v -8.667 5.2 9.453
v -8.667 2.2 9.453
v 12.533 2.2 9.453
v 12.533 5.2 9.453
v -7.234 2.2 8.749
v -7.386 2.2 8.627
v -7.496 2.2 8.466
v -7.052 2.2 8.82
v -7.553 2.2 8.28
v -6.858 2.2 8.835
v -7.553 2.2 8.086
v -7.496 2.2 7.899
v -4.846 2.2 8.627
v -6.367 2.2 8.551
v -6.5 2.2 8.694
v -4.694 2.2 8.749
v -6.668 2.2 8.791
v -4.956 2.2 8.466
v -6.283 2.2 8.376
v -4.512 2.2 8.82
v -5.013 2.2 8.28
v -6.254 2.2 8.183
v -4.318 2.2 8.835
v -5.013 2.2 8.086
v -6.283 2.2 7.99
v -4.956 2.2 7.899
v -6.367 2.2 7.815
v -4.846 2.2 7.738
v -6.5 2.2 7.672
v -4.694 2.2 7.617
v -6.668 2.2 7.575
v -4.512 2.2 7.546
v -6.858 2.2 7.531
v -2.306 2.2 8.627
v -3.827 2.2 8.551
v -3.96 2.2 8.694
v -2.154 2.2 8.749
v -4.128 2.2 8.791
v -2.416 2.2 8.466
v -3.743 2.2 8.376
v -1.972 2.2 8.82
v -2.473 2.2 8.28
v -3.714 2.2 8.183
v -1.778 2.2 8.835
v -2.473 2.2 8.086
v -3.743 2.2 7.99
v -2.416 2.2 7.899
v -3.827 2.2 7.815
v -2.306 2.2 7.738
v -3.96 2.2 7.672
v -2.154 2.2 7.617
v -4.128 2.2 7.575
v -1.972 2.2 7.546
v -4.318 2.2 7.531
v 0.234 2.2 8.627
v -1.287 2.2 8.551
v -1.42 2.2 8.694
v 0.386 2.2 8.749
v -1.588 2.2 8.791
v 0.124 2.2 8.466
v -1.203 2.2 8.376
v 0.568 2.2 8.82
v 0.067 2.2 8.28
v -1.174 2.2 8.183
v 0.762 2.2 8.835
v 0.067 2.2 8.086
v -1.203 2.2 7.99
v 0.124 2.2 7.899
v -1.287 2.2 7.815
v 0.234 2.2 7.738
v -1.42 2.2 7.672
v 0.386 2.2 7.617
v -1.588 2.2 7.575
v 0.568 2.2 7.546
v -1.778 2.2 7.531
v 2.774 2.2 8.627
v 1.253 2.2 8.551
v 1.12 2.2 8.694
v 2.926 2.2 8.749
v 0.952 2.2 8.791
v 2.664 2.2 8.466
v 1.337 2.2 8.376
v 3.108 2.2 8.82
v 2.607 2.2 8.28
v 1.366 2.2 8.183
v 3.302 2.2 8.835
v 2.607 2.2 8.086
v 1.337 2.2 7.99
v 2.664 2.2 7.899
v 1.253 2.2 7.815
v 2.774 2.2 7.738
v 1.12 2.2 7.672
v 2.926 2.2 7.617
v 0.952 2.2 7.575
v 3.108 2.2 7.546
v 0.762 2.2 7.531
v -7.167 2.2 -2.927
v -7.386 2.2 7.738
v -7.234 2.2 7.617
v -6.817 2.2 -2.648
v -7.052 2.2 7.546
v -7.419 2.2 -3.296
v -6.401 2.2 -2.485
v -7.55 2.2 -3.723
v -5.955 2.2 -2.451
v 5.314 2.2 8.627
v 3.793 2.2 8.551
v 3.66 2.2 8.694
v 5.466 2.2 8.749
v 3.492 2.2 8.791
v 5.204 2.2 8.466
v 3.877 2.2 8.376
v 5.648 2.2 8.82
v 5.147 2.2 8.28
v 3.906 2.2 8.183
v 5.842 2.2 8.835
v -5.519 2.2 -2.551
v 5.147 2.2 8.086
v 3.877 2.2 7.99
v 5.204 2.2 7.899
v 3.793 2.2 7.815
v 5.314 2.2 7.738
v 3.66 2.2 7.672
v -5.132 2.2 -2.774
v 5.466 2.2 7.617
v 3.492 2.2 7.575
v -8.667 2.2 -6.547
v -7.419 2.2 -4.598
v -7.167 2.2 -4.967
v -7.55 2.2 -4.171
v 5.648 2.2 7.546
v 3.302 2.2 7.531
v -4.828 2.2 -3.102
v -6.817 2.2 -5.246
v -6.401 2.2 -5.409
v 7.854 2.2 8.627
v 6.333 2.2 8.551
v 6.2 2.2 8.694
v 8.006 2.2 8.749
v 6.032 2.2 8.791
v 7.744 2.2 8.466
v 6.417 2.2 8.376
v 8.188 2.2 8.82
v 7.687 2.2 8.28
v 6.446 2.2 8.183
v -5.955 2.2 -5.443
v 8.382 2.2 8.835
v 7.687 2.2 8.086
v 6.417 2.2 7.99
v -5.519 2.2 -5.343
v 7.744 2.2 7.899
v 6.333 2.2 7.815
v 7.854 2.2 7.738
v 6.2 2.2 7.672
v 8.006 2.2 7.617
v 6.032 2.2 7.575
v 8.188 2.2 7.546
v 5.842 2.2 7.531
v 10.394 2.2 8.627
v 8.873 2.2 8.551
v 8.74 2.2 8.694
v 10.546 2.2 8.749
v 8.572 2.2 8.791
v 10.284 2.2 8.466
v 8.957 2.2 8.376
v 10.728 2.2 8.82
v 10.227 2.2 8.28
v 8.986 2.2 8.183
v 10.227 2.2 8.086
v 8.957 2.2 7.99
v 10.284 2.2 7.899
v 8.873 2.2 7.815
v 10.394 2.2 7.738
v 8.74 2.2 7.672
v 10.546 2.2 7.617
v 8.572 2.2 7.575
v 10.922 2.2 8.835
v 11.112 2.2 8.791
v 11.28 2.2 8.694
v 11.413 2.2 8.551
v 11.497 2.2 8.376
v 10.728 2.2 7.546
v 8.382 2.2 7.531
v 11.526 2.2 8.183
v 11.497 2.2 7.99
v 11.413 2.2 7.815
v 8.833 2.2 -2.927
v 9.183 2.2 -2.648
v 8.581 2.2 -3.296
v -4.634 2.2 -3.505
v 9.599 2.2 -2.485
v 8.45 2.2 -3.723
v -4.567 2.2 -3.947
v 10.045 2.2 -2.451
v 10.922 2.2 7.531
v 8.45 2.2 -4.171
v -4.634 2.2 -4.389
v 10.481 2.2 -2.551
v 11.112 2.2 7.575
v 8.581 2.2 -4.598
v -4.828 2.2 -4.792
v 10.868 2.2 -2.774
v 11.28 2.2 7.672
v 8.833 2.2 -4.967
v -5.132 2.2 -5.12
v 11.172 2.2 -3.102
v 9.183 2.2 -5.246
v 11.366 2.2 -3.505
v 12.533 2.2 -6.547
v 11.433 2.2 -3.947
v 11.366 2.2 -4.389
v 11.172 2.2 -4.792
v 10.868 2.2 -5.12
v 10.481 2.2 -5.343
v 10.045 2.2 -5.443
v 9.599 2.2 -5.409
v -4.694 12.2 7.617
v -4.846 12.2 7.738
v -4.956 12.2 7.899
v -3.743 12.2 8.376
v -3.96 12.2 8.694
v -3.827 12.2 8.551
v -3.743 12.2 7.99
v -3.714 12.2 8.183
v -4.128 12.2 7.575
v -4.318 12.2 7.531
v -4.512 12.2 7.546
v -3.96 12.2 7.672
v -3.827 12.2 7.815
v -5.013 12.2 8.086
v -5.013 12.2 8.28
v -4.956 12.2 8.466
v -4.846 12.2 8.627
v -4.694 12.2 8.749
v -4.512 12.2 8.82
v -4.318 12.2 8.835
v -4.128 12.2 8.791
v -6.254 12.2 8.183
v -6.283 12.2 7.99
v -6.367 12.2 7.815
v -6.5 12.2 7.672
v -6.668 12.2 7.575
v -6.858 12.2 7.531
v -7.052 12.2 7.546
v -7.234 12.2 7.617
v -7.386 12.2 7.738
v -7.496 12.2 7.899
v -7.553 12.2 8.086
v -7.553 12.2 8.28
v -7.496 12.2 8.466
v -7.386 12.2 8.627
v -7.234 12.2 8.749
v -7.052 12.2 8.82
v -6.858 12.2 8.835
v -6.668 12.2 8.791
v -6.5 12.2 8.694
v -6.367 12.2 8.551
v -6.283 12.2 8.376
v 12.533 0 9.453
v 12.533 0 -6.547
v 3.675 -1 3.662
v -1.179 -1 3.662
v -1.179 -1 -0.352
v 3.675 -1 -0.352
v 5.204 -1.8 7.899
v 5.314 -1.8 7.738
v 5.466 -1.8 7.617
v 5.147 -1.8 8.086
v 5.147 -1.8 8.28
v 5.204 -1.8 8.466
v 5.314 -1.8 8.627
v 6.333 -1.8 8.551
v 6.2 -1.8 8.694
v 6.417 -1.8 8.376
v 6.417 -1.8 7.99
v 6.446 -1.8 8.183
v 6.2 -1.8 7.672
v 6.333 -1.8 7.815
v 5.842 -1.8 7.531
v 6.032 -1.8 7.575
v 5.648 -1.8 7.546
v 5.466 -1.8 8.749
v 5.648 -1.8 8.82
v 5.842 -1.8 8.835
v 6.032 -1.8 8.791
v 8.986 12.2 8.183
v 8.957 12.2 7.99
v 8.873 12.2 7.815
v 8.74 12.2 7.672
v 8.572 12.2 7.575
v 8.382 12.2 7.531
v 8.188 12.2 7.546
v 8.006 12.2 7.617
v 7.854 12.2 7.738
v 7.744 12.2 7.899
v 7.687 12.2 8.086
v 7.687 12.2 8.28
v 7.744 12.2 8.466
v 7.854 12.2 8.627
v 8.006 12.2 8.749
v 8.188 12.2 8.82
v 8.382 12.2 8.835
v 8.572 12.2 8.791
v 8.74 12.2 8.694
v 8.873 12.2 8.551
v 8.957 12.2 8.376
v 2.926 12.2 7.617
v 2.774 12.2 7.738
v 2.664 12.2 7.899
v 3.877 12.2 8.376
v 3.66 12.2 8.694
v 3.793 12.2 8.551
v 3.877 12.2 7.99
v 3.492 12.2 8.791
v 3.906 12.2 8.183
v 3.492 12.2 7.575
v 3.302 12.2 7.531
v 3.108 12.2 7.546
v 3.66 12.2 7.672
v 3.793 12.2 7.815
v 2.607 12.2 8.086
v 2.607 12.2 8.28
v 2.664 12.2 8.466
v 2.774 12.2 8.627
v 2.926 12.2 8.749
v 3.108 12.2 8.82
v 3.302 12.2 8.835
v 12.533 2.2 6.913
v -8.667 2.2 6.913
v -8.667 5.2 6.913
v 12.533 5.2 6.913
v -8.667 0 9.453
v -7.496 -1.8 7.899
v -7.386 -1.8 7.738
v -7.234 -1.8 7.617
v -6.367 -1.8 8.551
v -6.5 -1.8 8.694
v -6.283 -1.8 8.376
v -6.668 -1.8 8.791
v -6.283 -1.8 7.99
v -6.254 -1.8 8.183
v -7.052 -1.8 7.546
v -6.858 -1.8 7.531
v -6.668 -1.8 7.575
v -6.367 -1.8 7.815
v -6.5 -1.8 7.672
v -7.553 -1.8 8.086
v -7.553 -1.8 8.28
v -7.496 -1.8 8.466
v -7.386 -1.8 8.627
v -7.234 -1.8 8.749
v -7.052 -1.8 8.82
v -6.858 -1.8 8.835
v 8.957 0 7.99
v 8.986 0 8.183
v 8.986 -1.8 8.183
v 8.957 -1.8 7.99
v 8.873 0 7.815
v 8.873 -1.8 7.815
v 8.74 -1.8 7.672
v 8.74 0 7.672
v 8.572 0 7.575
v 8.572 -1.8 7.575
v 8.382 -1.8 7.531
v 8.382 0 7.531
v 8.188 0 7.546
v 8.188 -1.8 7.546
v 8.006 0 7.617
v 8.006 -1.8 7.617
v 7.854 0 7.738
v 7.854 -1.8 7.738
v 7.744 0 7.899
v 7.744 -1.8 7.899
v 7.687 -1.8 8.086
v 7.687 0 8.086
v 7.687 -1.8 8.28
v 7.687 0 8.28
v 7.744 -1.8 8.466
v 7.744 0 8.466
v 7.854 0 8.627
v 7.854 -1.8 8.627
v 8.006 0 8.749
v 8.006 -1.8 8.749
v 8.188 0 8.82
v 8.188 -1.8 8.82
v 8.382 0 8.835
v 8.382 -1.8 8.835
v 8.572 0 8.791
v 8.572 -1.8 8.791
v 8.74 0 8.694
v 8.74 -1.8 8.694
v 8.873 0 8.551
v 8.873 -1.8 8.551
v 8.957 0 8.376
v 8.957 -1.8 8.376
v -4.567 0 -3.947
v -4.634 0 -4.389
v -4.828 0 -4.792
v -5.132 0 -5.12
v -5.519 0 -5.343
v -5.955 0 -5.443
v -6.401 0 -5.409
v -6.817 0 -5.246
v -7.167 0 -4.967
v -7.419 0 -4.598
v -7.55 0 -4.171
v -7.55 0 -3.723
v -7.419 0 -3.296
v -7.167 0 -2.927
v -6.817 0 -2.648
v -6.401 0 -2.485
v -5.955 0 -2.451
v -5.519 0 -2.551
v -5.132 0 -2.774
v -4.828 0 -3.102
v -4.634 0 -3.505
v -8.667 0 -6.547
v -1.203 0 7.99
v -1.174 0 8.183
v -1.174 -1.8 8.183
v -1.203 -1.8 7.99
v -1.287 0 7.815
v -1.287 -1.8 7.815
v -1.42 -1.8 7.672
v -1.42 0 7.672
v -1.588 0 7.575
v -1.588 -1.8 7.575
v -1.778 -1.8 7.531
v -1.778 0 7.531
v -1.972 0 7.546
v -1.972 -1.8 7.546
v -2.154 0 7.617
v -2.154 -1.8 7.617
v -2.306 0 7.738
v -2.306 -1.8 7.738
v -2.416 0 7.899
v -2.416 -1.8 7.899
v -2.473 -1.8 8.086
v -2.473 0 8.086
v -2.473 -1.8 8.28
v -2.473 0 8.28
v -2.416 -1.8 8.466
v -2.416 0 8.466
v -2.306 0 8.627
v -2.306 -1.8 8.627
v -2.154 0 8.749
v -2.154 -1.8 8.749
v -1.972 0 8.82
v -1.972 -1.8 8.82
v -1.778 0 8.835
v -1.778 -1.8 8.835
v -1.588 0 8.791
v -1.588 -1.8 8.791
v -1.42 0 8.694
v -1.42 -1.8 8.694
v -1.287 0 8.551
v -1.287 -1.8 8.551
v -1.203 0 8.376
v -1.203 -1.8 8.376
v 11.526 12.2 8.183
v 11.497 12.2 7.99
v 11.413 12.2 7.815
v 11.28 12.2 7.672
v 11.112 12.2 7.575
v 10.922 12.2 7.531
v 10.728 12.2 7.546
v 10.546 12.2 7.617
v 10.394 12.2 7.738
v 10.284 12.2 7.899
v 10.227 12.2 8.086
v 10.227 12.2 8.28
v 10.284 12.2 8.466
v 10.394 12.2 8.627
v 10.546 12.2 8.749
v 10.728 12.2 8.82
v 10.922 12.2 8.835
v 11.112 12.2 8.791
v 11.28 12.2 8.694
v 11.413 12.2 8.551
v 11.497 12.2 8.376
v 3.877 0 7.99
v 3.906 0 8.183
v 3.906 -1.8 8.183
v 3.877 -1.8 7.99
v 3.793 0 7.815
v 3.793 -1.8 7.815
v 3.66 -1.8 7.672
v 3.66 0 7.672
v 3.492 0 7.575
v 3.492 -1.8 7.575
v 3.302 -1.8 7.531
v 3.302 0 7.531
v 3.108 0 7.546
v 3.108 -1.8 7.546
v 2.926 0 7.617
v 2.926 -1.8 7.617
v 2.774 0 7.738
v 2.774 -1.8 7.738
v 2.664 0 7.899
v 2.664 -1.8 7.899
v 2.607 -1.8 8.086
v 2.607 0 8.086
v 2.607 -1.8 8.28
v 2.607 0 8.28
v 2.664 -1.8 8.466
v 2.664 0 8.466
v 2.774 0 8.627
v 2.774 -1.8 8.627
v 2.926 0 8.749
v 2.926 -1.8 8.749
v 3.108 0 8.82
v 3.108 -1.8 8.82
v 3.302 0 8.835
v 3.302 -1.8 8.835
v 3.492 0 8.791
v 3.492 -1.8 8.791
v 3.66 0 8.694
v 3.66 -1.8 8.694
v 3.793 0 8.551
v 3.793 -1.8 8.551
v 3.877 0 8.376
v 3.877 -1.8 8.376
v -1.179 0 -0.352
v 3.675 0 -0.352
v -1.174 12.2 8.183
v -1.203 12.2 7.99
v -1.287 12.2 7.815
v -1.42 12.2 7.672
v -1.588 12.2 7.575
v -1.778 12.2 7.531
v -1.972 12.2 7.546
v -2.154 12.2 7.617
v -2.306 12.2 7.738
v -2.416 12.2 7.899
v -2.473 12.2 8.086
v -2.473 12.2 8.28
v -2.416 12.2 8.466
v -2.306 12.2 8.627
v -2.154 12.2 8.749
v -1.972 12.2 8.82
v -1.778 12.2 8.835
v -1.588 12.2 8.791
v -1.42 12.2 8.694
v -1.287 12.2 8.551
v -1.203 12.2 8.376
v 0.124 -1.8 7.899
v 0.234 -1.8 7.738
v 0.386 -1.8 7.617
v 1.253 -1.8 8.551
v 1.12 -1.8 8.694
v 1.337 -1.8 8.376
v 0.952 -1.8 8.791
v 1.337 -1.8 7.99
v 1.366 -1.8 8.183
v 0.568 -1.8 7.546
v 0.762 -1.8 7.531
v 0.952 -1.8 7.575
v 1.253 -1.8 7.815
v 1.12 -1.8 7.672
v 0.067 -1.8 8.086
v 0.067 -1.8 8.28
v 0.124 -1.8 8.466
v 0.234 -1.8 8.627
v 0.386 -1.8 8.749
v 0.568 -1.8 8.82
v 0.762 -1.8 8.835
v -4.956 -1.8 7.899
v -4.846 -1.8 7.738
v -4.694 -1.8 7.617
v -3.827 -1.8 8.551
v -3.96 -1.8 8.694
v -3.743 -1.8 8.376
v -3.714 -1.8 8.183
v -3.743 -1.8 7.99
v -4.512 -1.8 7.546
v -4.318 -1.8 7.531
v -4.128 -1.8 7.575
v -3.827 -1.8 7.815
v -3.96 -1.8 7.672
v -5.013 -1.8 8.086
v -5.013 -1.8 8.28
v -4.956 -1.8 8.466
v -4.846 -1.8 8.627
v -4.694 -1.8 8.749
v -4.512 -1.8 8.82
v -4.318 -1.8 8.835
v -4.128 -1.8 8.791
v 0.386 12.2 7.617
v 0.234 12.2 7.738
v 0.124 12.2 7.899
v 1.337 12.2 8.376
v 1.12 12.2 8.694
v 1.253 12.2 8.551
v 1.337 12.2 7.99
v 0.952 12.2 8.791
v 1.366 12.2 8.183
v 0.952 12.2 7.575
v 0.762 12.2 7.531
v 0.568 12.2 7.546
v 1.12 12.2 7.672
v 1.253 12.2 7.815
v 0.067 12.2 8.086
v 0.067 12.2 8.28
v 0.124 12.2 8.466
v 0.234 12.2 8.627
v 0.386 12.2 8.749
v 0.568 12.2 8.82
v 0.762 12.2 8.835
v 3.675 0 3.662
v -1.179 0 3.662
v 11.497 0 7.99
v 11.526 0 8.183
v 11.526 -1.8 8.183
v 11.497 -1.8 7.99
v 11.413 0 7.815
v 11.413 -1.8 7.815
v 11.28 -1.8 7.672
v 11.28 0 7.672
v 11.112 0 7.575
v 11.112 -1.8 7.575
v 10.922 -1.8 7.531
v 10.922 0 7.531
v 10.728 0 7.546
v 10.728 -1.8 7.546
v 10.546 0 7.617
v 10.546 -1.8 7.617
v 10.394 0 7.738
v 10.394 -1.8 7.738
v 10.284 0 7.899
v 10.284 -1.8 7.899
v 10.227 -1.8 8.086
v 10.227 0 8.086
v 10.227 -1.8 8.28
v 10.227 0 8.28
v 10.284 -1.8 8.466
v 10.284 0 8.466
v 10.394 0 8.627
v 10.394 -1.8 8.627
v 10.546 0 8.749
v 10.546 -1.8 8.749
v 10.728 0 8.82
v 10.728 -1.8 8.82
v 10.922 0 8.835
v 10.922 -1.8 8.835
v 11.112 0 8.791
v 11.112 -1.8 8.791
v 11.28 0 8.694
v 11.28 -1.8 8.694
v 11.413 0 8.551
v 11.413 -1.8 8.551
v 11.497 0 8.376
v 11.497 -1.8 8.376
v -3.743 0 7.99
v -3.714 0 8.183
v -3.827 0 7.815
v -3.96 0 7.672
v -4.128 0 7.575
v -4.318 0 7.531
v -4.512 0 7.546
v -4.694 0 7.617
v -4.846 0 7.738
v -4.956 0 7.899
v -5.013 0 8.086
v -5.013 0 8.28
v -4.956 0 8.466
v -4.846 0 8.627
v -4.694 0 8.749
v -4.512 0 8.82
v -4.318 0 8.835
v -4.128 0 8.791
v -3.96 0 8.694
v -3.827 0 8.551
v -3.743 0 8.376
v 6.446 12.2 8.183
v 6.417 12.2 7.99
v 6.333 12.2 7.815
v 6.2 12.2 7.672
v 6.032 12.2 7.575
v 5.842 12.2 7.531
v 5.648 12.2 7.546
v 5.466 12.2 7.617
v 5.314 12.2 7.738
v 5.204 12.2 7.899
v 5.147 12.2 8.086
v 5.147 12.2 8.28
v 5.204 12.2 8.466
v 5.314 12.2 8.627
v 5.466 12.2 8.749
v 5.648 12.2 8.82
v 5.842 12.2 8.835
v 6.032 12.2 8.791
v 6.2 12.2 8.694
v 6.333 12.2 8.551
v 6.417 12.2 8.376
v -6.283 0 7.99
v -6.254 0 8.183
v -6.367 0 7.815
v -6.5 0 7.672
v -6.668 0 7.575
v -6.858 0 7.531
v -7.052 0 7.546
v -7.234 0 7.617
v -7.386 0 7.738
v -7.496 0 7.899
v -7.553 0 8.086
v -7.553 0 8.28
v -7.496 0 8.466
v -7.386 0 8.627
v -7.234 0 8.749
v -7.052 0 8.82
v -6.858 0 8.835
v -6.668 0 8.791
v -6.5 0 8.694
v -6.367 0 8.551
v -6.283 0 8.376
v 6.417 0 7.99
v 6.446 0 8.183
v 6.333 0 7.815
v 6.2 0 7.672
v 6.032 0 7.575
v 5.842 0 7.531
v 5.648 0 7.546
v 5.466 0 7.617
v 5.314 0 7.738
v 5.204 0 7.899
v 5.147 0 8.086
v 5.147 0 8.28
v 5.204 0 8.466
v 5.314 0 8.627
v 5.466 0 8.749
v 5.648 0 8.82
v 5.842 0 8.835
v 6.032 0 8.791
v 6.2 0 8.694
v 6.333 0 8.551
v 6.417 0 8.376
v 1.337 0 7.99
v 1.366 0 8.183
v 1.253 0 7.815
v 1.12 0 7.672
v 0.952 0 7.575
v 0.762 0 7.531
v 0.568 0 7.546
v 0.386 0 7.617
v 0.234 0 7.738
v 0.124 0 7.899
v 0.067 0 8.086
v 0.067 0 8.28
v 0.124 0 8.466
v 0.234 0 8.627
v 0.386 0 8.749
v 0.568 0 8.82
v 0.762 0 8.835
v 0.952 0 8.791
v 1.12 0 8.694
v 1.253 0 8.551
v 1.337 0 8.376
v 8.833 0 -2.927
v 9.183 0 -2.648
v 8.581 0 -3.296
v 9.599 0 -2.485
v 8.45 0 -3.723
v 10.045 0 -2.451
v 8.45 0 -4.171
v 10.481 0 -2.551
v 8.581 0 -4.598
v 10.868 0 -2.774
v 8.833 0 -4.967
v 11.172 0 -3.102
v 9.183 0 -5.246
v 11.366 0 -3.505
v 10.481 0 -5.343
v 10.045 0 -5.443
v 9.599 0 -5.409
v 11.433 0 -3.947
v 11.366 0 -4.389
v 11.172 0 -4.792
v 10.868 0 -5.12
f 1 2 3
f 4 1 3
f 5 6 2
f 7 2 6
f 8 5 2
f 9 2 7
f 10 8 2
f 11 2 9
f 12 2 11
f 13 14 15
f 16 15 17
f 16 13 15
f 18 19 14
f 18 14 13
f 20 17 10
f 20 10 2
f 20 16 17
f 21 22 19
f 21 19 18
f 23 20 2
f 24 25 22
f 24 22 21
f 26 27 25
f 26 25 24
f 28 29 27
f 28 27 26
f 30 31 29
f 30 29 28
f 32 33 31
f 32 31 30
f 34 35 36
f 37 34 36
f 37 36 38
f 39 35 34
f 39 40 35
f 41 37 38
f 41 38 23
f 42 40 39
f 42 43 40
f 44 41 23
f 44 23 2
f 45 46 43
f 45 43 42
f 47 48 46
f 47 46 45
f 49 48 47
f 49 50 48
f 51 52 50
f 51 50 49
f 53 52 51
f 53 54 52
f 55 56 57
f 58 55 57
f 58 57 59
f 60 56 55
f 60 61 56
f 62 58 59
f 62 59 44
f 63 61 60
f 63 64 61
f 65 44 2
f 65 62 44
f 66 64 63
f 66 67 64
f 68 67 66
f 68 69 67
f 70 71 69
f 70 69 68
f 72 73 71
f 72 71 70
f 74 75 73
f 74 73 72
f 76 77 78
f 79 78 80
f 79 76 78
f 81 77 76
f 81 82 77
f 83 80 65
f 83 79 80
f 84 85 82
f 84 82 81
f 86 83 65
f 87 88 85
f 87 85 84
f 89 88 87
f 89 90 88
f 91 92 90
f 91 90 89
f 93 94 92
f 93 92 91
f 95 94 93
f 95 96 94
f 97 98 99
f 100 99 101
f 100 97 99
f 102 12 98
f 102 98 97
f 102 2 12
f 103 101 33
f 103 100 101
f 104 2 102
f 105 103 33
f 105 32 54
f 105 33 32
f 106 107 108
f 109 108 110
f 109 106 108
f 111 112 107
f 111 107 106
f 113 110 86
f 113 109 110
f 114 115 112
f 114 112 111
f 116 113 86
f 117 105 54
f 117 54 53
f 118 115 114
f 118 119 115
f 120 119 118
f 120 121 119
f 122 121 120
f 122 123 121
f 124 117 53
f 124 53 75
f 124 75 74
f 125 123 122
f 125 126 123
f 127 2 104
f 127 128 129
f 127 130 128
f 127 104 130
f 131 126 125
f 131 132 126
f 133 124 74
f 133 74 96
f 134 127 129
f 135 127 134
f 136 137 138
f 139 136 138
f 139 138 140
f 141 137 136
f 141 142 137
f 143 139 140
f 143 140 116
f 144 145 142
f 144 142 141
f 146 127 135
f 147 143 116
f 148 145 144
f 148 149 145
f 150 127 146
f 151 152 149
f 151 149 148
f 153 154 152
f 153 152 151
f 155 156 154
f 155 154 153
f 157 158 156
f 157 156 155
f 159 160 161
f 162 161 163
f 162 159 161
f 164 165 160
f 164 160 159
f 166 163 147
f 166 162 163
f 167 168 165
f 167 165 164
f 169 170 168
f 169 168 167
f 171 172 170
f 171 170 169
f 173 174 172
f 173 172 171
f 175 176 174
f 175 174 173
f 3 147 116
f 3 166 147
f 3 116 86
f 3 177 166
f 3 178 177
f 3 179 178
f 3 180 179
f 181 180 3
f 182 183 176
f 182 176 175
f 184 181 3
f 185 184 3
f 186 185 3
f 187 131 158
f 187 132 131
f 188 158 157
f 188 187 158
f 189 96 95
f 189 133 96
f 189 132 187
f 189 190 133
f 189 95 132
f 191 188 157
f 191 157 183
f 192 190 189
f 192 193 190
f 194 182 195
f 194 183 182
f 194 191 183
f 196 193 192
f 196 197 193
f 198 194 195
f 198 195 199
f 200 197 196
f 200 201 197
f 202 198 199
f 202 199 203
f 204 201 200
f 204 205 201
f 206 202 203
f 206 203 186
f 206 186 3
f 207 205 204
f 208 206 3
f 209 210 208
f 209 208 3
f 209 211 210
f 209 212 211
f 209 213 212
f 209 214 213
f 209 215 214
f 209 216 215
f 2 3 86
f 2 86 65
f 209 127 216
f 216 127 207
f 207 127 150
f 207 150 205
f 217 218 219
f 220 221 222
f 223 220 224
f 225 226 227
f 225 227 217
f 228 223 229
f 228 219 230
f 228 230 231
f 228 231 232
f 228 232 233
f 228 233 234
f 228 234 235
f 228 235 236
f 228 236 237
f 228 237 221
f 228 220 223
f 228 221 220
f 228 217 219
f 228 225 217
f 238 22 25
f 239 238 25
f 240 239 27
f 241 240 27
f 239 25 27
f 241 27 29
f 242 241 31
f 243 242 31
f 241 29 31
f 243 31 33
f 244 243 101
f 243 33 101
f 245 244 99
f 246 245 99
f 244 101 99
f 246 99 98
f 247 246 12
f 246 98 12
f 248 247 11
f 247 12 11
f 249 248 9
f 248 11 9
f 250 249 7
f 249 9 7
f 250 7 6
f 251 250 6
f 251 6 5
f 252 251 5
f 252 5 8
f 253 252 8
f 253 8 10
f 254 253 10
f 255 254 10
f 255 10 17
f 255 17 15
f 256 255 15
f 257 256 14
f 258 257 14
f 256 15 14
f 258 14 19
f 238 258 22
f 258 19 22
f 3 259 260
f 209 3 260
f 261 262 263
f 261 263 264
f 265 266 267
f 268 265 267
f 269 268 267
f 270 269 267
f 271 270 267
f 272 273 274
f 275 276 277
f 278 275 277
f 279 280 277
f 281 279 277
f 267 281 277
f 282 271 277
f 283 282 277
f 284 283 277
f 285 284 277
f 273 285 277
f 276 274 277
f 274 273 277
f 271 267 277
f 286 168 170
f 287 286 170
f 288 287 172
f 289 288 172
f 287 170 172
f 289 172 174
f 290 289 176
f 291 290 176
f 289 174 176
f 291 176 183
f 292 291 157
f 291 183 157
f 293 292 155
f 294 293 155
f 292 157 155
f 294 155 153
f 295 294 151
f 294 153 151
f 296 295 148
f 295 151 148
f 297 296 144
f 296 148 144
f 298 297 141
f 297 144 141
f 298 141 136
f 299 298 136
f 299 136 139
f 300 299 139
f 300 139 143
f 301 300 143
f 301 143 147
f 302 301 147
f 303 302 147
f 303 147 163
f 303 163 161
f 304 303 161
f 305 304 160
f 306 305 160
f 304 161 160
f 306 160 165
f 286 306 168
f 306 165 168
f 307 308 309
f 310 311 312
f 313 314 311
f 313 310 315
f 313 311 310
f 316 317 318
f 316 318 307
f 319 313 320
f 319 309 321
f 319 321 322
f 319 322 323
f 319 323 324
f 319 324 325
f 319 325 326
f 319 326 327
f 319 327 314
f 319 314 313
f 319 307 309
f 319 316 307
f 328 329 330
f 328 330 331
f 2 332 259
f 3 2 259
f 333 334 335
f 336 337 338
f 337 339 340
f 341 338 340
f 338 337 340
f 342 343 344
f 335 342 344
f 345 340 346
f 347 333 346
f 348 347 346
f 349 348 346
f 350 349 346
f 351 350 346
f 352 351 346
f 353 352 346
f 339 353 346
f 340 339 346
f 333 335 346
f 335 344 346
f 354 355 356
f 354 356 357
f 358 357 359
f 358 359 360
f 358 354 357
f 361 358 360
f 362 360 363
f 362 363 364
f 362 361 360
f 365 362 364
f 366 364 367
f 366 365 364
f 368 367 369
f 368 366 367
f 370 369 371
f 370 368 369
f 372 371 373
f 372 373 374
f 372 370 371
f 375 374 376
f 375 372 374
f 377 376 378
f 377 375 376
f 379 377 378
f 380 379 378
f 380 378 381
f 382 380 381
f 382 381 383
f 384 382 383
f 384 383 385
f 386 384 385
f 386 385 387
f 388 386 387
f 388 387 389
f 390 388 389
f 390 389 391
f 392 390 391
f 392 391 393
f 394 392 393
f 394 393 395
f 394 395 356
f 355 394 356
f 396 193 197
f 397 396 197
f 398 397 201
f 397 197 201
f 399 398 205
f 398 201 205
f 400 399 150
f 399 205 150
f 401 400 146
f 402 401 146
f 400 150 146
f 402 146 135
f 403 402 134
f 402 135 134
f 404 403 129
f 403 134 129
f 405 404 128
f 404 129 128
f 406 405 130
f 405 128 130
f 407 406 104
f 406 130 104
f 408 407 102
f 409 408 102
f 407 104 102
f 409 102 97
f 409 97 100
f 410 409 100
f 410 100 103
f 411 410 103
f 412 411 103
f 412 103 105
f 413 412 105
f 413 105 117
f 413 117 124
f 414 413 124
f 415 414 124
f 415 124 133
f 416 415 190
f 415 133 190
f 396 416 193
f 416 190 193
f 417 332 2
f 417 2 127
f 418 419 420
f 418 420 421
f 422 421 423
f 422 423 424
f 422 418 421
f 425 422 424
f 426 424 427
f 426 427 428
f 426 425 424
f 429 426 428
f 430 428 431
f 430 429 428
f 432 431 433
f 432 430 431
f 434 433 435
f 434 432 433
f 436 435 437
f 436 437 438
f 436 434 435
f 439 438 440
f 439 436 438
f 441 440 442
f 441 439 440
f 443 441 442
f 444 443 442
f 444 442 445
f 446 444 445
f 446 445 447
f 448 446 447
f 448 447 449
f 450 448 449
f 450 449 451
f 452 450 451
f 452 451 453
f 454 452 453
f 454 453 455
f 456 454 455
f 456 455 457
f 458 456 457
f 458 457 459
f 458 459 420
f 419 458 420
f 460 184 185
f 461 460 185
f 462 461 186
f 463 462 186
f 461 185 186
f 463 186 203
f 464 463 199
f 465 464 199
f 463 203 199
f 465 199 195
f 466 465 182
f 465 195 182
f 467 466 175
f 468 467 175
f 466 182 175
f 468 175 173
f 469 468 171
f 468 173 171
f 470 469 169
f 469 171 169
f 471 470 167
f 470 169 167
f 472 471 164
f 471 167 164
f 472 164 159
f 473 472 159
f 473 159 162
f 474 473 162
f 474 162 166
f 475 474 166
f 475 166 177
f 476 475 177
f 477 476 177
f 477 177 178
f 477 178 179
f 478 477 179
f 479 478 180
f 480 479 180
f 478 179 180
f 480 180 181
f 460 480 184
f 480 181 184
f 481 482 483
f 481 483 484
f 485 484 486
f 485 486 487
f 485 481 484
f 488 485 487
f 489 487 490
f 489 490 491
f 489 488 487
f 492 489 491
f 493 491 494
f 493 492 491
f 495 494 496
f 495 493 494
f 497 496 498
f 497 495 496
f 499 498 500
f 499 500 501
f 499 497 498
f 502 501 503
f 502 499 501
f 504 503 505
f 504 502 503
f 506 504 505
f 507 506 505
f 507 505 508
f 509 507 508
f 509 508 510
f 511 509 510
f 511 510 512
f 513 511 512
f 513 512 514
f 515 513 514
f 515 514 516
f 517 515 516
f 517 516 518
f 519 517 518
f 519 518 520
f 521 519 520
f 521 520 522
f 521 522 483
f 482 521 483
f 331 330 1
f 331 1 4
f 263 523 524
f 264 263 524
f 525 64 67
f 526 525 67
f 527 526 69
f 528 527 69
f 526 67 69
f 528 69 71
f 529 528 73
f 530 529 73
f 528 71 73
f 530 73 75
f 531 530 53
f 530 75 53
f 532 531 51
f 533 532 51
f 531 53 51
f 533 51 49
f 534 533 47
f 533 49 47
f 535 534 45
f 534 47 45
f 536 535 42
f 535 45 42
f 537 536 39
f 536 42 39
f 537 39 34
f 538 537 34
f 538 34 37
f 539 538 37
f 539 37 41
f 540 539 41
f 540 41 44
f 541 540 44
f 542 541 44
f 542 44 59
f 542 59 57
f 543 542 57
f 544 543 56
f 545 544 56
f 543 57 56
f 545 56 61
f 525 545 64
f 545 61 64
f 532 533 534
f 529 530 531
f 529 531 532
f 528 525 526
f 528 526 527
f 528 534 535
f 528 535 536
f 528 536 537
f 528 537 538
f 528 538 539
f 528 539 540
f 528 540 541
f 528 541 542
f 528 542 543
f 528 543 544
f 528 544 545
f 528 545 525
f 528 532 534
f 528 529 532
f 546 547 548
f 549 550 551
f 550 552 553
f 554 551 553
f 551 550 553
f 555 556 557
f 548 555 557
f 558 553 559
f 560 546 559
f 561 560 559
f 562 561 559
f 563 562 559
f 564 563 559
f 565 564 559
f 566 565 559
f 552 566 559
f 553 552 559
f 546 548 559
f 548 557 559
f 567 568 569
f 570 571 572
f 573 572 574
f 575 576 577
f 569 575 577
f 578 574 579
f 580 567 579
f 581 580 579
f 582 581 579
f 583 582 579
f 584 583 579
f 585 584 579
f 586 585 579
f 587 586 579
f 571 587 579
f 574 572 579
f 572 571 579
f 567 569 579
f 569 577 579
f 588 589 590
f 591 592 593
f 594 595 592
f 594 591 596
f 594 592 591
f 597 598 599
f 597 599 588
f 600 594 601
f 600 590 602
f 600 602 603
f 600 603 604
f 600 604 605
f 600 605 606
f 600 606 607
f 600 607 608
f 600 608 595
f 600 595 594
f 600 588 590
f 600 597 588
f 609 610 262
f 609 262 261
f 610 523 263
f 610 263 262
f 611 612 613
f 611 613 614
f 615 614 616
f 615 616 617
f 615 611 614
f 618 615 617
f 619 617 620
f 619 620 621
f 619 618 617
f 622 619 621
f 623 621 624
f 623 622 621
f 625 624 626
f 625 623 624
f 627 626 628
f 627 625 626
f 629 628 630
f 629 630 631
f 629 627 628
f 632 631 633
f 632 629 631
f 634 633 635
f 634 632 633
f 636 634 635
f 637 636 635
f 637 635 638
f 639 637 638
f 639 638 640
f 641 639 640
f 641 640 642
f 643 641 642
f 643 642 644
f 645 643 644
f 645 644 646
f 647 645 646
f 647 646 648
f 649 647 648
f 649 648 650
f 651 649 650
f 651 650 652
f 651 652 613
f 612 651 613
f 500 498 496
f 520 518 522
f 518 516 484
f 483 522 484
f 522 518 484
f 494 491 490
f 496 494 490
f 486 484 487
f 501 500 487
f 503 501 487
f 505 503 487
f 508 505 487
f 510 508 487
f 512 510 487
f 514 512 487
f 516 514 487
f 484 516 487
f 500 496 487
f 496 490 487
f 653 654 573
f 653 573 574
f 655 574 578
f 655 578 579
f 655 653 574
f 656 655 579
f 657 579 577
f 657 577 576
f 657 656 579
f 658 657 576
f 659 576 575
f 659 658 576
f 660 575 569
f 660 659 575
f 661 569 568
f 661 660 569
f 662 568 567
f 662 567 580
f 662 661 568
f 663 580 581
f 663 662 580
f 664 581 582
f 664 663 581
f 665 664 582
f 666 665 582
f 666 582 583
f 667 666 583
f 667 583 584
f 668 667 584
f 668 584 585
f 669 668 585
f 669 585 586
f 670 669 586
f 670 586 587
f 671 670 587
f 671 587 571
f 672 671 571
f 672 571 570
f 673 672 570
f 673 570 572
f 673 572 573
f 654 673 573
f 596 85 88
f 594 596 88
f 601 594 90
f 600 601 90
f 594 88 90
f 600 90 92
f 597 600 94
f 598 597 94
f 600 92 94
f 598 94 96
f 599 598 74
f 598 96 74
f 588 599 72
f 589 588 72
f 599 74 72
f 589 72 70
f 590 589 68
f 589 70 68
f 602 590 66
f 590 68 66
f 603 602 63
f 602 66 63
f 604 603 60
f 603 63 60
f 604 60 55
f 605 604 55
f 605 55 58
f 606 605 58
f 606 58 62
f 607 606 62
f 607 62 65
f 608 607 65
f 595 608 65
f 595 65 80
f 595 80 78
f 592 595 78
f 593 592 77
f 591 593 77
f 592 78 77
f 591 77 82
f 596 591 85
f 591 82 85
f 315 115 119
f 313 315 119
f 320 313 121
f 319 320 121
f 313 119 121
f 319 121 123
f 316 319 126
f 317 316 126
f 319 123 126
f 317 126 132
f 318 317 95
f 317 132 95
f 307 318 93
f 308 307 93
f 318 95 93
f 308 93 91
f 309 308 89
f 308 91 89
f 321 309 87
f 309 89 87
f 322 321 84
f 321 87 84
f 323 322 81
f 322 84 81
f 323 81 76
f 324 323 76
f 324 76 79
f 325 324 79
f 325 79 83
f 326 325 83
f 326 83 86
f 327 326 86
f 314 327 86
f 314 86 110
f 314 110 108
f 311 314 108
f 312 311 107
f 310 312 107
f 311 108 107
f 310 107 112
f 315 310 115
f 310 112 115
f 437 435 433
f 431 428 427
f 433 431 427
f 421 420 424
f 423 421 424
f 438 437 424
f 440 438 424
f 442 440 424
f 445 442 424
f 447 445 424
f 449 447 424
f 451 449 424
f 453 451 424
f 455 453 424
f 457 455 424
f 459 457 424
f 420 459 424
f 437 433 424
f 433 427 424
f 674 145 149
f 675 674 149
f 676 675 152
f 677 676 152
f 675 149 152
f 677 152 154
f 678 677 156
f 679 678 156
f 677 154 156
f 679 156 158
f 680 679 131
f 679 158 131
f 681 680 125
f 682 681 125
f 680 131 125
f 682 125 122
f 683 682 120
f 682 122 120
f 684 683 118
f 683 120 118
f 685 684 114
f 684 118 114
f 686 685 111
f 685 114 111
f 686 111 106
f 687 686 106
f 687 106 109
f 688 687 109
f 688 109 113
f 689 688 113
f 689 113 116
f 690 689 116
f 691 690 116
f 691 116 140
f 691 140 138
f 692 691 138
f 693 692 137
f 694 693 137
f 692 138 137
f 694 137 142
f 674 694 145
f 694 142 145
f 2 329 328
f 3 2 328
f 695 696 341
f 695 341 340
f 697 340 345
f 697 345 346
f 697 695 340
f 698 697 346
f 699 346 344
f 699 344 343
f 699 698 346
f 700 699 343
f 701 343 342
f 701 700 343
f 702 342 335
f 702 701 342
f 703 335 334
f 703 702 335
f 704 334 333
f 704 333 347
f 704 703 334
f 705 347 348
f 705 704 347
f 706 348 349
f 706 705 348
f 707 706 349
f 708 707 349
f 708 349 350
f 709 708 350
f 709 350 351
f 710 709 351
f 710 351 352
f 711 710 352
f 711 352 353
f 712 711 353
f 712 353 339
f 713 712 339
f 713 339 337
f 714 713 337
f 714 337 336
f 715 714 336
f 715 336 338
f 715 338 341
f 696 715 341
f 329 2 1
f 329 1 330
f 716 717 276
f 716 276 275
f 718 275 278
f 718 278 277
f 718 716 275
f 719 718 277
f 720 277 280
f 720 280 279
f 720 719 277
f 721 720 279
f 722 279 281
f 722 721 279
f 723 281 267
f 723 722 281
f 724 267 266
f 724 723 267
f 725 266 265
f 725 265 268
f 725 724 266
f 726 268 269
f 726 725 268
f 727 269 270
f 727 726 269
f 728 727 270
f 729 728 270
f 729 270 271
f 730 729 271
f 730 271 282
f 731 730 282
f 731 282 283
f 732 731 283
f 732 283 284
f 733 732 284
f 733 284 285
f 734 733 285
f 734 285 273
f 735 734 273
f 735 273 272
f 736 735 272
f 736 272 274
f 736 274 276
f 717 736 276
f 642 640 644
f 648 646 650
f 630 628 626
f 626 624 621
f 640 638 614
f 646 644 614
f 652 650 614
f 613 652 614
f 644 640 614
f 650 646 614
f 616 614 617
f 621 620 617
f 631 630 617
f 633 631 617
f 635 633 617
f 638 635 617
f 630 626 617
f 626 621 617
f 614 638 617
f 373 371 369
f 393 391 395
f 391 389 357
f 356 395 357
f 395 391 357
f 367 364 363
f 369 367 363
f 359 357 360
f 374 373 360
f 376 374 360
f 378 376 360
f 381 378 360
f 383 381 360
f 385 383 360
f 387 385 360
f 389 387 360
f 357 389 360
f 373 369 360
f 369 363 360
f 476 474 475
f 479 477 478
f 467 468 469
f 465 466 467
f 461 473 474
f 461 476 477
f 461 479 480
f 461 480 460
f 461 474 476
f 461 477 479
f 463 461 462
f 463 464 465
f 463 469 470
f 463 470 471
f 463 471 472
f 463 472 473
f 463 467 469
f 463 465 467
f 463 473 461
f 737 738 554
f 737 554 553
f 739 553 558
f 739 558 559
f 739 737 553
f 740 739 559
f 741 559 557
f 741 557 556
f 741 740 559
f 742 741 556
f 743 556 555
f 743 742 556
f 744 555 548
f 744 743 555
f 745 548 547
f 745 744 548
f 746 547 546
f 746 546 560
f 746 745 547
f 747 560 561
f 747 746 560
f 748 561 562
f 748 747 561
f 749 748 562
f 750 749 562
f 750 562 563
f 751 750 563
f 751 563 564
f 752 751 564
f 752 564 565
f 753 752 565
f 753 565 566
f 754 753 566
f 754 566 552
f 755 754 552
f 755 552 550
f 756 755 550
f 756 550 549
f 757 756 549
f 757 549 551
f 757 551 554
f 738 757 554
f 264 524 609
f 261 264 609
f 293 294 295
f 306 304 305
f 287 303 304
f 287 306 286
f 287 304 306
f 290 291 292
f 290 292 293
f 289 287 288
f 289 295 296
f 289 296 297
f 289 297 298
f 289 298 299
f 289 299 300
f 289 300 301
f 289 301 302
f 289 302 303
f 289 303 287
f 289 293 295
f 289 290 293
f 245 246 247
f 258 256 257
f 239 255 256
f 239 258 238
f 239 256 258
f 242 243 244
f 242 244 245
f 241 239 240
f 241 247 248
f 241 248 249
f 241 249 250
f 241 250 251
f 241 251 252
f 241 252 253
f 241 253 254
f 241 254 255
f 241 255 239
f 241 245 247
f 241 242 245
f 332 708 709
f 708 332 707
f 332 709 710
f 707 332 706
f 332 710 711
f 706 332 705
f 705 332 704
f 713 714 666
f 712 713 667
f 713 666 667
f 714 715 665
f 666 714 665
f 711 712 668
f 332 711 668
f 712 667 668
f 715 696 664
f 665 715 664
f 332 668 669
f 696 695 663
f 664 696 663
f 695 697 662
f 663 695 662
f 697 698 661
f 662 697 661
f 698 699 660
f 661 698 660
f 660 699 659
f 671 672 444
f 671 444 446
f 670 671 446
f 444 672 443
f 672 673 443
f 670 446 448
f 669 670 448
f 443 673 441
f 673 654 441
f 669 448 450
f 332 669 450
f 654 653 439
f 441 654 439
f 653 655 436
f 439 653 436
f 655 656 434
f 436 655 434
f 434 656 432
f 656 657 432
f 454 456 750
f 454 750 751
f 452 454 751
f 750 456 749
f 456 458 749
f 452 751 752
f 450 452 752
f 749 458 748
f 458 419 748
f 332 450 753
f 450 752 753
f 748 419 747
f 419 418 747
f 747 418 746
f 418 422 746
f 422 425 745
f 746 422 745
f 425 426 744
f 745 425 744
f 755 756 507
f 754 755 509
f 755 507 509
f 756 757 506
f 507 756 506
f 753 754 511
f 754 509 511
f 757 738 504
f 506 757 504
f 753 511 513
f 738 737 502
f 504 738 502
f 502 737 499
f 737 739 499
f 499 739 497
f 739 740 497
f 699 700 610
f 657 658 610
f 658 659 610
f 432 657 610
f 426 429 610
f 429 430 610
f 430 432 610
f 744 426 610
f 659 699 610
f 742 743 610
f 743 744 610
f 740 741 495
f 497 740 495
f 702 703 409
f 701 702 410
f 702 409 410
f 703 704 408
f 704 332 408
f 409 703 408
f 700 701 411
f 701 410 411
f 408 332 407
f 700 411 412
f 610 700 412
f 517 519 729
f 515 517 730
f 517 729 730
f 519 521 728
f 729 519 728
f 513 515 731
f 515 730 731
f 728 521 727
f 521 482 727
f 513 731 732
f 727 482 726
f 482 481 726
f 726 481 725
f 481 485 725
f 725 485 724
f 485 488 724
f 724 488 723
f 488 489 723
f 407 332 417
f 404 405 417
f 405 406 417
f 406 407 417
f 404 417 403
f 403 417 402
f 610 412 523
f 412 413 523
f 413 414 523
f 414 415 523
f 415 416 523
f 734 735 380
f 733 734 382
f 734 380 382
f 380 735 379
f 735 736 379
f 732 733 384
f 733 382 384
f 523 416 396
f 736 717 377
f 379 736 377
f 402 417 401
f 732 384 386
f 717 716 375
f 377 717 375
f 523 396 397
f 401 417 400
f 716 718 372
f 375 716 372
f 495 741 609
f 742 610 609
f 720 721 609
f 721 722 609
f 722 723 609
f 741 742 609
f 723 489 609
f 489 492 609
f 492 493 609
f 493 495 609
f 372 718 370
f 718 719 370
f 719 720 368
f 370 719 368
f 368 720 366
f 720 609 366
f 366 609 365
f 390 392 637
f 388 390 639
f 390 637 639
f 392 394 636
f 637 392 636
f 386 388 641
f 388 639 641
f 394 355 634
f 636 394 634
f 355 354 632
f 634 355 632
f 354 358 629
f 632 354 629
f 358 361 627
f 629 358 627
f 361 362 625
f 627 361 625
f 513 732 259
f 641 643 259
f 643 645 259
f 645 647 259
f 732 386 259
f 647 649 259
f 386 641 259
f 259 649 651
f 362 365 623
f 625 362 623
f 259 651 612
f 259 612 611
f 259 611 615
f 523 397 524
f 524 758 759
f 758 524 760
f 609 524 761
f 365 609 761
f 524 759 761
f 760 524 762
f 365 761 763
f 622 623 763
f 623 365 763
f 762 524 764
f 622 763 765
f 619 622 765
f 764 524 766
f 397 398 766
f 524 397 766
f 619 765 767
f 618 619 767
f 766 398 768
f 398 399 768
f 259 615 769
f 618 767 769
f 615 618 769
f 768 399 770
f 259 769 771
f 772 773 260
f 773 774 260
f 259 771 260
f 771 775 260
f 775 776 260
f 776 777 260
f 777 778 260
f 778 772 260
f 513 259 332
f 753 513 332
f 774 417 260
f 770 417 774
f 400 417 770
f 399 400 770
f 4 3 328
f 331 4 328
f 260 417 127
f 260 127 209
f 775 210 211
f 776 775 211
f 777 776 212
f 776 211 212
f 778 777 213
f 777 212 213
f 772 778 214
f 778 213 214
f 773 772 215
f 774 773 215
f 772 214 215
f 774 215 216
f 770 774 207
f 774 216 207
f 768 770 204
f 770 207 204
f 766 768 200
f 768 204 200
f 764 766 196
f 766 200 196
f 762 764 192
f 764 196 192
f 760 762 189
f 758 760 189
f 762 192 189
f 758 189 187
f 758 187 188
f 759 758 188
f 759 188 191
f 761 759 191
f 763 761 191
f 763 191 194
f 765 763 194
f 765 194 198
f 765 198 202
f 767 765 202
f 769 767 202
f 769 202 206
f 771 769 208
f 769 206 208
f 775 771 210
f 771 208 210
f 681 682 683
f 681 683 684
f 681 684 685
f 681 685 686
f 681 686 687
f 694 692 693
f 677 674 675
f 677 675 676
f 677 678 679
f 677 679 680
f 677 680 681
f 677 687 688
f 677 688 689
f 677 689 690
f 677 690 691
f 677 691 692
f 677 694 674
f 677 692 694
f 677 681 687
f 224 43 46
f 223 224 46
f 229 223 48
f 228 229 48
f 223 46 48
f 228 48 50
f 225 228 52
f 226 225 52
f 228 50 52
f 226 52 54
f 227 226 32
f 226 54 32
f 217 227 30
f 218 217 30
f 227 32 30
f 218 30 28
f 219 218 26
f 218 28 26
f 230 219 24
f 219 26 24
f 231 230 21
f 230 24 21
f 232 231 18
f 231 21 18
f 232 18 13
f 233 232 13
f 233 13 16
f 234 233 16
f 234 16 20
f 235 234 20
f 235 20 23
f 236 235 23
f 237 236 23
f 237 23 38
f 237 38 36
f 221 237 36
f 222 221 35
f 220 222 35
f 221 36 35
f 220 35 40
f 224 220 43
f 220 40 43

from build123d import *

# Parameters (mm, degrees)
SKETCH1_W                = 21.2
SKETCH1_H                = 16
BOSS_EXTRUDE1_DEPTH      = 2.2
SKETCH2_R                = 1.5
CUT_EXTRUDE1_DEPTH       = 2.2
SKETCH3_R                = 0.653464603
BOSS_EXTRUDE2_DEPTH      = 10
BOSS_EXTRUDE2_DEPTH_BACK = 4
SKETCH4_W                = 21.2
SKETCH4_H                = 2.54
BOSS_EXTRUDE3_DEPTH      = 3
SKETCH5_W                = 4.85373887
SKETCH5_H                = 4.013612747
BOSS_EXTRUDE4_DEPTH      = 1


with BuildPart() as part:
    # Sketch1 → Boss-Extrude1 (new body)
    with BuildSketch(Plane(origin=(0, 0, 0), x_dir=(1, 0, 0), z_dir=(0, 1, 0))):
        with Locations((1.932941176, -1.452941176)):
            Rectangle(SKETCH1_W, SKETCH1_H)
    extrude(amount=BOSS_EXTRUDE1_DEPTH)

    # Sketch2 → Cut-Extrude1 (cut)
    with BuildSketch(Plane(origin=(0, 2.2, 0), x_dir=(1, 0, 0), z_dir=(0, 1, 0))):
        with Locations((-6.067058824, 3.947058824)):
            Circle(SKETCH2_R)
        with Locations((9.932941176, 3.947058824)):
            Circle(SKETCH2_R)
    extrude(amount=-CUT_EXTRUDE1_DEPTH, mode=Mode.SUBTRACT)

    # Sketch3 → Boss-Extrude2 (add, two sides)
    with BuildSketch(Plane(origin=(0, 2.2, 0), x_dir=(1, 0, 0), z_dir=(0, 1, 0))) as boss_extrude2_sk:
        with Locations((-6.907058824, -8.182941176)):
            Circle(SKETCH3_R)
        with Locations((-4.367058824, -8.182941176)):
            Circle(SKETCH3_R)
        with Locations((-1.827058824, -8.182941176)):
            Circle(SKETCH3_R)
        with Locations((0.712941176, -8.182941176)):
            Circle(SKETCH3_R)
        with Locations((3.252941176, -8.182941176)):
            Circle(SKETCH3_R)
        with Locations((5.792941176, -8.182941176)):
            Circle(SKETCH3_R)
        with Locations((8.332941176, -8.182941176)):
            Circle(SKETCH3_R)
        with Locations((10.872941176, -8.182941176)):
            Circle(SKETCH3_R)
    extrude(amount=BOSS_EXTRUDE2_DEPTH)
    extrude(boss_extrude2_sk.sketch, amount=-BOSS_EXTRUDE2_DEPTH_BACK)

    # Sketch5 → Boss-Extrude4 (add)
    with BuildSketch(Plane.XZ):
        with Locations((1.248041988, 1.655101133)):
            Rectangle(SKETCH5_W, SKETCH5_H)
    extrude(amount=BOSS_EXTRUDE4_DEPTH)


with BuildPart() as body_2:
    # Sketch4 → Boss-Extrude3 (new body)
    with BuildSketch(Plane(origin=(0, 2.2, 0), x_dir=(1, 0, 0), z_dir=(0, 1, 0))):
        with Locations((1.932941176, -8.182941176)):
            Rectangle(SKETCH4_W, SKETCH4_H)
    extrude(amount=BOSS_EXTRUDE3_DEPTH)


solid = Compound([part.part, body_2.part])
